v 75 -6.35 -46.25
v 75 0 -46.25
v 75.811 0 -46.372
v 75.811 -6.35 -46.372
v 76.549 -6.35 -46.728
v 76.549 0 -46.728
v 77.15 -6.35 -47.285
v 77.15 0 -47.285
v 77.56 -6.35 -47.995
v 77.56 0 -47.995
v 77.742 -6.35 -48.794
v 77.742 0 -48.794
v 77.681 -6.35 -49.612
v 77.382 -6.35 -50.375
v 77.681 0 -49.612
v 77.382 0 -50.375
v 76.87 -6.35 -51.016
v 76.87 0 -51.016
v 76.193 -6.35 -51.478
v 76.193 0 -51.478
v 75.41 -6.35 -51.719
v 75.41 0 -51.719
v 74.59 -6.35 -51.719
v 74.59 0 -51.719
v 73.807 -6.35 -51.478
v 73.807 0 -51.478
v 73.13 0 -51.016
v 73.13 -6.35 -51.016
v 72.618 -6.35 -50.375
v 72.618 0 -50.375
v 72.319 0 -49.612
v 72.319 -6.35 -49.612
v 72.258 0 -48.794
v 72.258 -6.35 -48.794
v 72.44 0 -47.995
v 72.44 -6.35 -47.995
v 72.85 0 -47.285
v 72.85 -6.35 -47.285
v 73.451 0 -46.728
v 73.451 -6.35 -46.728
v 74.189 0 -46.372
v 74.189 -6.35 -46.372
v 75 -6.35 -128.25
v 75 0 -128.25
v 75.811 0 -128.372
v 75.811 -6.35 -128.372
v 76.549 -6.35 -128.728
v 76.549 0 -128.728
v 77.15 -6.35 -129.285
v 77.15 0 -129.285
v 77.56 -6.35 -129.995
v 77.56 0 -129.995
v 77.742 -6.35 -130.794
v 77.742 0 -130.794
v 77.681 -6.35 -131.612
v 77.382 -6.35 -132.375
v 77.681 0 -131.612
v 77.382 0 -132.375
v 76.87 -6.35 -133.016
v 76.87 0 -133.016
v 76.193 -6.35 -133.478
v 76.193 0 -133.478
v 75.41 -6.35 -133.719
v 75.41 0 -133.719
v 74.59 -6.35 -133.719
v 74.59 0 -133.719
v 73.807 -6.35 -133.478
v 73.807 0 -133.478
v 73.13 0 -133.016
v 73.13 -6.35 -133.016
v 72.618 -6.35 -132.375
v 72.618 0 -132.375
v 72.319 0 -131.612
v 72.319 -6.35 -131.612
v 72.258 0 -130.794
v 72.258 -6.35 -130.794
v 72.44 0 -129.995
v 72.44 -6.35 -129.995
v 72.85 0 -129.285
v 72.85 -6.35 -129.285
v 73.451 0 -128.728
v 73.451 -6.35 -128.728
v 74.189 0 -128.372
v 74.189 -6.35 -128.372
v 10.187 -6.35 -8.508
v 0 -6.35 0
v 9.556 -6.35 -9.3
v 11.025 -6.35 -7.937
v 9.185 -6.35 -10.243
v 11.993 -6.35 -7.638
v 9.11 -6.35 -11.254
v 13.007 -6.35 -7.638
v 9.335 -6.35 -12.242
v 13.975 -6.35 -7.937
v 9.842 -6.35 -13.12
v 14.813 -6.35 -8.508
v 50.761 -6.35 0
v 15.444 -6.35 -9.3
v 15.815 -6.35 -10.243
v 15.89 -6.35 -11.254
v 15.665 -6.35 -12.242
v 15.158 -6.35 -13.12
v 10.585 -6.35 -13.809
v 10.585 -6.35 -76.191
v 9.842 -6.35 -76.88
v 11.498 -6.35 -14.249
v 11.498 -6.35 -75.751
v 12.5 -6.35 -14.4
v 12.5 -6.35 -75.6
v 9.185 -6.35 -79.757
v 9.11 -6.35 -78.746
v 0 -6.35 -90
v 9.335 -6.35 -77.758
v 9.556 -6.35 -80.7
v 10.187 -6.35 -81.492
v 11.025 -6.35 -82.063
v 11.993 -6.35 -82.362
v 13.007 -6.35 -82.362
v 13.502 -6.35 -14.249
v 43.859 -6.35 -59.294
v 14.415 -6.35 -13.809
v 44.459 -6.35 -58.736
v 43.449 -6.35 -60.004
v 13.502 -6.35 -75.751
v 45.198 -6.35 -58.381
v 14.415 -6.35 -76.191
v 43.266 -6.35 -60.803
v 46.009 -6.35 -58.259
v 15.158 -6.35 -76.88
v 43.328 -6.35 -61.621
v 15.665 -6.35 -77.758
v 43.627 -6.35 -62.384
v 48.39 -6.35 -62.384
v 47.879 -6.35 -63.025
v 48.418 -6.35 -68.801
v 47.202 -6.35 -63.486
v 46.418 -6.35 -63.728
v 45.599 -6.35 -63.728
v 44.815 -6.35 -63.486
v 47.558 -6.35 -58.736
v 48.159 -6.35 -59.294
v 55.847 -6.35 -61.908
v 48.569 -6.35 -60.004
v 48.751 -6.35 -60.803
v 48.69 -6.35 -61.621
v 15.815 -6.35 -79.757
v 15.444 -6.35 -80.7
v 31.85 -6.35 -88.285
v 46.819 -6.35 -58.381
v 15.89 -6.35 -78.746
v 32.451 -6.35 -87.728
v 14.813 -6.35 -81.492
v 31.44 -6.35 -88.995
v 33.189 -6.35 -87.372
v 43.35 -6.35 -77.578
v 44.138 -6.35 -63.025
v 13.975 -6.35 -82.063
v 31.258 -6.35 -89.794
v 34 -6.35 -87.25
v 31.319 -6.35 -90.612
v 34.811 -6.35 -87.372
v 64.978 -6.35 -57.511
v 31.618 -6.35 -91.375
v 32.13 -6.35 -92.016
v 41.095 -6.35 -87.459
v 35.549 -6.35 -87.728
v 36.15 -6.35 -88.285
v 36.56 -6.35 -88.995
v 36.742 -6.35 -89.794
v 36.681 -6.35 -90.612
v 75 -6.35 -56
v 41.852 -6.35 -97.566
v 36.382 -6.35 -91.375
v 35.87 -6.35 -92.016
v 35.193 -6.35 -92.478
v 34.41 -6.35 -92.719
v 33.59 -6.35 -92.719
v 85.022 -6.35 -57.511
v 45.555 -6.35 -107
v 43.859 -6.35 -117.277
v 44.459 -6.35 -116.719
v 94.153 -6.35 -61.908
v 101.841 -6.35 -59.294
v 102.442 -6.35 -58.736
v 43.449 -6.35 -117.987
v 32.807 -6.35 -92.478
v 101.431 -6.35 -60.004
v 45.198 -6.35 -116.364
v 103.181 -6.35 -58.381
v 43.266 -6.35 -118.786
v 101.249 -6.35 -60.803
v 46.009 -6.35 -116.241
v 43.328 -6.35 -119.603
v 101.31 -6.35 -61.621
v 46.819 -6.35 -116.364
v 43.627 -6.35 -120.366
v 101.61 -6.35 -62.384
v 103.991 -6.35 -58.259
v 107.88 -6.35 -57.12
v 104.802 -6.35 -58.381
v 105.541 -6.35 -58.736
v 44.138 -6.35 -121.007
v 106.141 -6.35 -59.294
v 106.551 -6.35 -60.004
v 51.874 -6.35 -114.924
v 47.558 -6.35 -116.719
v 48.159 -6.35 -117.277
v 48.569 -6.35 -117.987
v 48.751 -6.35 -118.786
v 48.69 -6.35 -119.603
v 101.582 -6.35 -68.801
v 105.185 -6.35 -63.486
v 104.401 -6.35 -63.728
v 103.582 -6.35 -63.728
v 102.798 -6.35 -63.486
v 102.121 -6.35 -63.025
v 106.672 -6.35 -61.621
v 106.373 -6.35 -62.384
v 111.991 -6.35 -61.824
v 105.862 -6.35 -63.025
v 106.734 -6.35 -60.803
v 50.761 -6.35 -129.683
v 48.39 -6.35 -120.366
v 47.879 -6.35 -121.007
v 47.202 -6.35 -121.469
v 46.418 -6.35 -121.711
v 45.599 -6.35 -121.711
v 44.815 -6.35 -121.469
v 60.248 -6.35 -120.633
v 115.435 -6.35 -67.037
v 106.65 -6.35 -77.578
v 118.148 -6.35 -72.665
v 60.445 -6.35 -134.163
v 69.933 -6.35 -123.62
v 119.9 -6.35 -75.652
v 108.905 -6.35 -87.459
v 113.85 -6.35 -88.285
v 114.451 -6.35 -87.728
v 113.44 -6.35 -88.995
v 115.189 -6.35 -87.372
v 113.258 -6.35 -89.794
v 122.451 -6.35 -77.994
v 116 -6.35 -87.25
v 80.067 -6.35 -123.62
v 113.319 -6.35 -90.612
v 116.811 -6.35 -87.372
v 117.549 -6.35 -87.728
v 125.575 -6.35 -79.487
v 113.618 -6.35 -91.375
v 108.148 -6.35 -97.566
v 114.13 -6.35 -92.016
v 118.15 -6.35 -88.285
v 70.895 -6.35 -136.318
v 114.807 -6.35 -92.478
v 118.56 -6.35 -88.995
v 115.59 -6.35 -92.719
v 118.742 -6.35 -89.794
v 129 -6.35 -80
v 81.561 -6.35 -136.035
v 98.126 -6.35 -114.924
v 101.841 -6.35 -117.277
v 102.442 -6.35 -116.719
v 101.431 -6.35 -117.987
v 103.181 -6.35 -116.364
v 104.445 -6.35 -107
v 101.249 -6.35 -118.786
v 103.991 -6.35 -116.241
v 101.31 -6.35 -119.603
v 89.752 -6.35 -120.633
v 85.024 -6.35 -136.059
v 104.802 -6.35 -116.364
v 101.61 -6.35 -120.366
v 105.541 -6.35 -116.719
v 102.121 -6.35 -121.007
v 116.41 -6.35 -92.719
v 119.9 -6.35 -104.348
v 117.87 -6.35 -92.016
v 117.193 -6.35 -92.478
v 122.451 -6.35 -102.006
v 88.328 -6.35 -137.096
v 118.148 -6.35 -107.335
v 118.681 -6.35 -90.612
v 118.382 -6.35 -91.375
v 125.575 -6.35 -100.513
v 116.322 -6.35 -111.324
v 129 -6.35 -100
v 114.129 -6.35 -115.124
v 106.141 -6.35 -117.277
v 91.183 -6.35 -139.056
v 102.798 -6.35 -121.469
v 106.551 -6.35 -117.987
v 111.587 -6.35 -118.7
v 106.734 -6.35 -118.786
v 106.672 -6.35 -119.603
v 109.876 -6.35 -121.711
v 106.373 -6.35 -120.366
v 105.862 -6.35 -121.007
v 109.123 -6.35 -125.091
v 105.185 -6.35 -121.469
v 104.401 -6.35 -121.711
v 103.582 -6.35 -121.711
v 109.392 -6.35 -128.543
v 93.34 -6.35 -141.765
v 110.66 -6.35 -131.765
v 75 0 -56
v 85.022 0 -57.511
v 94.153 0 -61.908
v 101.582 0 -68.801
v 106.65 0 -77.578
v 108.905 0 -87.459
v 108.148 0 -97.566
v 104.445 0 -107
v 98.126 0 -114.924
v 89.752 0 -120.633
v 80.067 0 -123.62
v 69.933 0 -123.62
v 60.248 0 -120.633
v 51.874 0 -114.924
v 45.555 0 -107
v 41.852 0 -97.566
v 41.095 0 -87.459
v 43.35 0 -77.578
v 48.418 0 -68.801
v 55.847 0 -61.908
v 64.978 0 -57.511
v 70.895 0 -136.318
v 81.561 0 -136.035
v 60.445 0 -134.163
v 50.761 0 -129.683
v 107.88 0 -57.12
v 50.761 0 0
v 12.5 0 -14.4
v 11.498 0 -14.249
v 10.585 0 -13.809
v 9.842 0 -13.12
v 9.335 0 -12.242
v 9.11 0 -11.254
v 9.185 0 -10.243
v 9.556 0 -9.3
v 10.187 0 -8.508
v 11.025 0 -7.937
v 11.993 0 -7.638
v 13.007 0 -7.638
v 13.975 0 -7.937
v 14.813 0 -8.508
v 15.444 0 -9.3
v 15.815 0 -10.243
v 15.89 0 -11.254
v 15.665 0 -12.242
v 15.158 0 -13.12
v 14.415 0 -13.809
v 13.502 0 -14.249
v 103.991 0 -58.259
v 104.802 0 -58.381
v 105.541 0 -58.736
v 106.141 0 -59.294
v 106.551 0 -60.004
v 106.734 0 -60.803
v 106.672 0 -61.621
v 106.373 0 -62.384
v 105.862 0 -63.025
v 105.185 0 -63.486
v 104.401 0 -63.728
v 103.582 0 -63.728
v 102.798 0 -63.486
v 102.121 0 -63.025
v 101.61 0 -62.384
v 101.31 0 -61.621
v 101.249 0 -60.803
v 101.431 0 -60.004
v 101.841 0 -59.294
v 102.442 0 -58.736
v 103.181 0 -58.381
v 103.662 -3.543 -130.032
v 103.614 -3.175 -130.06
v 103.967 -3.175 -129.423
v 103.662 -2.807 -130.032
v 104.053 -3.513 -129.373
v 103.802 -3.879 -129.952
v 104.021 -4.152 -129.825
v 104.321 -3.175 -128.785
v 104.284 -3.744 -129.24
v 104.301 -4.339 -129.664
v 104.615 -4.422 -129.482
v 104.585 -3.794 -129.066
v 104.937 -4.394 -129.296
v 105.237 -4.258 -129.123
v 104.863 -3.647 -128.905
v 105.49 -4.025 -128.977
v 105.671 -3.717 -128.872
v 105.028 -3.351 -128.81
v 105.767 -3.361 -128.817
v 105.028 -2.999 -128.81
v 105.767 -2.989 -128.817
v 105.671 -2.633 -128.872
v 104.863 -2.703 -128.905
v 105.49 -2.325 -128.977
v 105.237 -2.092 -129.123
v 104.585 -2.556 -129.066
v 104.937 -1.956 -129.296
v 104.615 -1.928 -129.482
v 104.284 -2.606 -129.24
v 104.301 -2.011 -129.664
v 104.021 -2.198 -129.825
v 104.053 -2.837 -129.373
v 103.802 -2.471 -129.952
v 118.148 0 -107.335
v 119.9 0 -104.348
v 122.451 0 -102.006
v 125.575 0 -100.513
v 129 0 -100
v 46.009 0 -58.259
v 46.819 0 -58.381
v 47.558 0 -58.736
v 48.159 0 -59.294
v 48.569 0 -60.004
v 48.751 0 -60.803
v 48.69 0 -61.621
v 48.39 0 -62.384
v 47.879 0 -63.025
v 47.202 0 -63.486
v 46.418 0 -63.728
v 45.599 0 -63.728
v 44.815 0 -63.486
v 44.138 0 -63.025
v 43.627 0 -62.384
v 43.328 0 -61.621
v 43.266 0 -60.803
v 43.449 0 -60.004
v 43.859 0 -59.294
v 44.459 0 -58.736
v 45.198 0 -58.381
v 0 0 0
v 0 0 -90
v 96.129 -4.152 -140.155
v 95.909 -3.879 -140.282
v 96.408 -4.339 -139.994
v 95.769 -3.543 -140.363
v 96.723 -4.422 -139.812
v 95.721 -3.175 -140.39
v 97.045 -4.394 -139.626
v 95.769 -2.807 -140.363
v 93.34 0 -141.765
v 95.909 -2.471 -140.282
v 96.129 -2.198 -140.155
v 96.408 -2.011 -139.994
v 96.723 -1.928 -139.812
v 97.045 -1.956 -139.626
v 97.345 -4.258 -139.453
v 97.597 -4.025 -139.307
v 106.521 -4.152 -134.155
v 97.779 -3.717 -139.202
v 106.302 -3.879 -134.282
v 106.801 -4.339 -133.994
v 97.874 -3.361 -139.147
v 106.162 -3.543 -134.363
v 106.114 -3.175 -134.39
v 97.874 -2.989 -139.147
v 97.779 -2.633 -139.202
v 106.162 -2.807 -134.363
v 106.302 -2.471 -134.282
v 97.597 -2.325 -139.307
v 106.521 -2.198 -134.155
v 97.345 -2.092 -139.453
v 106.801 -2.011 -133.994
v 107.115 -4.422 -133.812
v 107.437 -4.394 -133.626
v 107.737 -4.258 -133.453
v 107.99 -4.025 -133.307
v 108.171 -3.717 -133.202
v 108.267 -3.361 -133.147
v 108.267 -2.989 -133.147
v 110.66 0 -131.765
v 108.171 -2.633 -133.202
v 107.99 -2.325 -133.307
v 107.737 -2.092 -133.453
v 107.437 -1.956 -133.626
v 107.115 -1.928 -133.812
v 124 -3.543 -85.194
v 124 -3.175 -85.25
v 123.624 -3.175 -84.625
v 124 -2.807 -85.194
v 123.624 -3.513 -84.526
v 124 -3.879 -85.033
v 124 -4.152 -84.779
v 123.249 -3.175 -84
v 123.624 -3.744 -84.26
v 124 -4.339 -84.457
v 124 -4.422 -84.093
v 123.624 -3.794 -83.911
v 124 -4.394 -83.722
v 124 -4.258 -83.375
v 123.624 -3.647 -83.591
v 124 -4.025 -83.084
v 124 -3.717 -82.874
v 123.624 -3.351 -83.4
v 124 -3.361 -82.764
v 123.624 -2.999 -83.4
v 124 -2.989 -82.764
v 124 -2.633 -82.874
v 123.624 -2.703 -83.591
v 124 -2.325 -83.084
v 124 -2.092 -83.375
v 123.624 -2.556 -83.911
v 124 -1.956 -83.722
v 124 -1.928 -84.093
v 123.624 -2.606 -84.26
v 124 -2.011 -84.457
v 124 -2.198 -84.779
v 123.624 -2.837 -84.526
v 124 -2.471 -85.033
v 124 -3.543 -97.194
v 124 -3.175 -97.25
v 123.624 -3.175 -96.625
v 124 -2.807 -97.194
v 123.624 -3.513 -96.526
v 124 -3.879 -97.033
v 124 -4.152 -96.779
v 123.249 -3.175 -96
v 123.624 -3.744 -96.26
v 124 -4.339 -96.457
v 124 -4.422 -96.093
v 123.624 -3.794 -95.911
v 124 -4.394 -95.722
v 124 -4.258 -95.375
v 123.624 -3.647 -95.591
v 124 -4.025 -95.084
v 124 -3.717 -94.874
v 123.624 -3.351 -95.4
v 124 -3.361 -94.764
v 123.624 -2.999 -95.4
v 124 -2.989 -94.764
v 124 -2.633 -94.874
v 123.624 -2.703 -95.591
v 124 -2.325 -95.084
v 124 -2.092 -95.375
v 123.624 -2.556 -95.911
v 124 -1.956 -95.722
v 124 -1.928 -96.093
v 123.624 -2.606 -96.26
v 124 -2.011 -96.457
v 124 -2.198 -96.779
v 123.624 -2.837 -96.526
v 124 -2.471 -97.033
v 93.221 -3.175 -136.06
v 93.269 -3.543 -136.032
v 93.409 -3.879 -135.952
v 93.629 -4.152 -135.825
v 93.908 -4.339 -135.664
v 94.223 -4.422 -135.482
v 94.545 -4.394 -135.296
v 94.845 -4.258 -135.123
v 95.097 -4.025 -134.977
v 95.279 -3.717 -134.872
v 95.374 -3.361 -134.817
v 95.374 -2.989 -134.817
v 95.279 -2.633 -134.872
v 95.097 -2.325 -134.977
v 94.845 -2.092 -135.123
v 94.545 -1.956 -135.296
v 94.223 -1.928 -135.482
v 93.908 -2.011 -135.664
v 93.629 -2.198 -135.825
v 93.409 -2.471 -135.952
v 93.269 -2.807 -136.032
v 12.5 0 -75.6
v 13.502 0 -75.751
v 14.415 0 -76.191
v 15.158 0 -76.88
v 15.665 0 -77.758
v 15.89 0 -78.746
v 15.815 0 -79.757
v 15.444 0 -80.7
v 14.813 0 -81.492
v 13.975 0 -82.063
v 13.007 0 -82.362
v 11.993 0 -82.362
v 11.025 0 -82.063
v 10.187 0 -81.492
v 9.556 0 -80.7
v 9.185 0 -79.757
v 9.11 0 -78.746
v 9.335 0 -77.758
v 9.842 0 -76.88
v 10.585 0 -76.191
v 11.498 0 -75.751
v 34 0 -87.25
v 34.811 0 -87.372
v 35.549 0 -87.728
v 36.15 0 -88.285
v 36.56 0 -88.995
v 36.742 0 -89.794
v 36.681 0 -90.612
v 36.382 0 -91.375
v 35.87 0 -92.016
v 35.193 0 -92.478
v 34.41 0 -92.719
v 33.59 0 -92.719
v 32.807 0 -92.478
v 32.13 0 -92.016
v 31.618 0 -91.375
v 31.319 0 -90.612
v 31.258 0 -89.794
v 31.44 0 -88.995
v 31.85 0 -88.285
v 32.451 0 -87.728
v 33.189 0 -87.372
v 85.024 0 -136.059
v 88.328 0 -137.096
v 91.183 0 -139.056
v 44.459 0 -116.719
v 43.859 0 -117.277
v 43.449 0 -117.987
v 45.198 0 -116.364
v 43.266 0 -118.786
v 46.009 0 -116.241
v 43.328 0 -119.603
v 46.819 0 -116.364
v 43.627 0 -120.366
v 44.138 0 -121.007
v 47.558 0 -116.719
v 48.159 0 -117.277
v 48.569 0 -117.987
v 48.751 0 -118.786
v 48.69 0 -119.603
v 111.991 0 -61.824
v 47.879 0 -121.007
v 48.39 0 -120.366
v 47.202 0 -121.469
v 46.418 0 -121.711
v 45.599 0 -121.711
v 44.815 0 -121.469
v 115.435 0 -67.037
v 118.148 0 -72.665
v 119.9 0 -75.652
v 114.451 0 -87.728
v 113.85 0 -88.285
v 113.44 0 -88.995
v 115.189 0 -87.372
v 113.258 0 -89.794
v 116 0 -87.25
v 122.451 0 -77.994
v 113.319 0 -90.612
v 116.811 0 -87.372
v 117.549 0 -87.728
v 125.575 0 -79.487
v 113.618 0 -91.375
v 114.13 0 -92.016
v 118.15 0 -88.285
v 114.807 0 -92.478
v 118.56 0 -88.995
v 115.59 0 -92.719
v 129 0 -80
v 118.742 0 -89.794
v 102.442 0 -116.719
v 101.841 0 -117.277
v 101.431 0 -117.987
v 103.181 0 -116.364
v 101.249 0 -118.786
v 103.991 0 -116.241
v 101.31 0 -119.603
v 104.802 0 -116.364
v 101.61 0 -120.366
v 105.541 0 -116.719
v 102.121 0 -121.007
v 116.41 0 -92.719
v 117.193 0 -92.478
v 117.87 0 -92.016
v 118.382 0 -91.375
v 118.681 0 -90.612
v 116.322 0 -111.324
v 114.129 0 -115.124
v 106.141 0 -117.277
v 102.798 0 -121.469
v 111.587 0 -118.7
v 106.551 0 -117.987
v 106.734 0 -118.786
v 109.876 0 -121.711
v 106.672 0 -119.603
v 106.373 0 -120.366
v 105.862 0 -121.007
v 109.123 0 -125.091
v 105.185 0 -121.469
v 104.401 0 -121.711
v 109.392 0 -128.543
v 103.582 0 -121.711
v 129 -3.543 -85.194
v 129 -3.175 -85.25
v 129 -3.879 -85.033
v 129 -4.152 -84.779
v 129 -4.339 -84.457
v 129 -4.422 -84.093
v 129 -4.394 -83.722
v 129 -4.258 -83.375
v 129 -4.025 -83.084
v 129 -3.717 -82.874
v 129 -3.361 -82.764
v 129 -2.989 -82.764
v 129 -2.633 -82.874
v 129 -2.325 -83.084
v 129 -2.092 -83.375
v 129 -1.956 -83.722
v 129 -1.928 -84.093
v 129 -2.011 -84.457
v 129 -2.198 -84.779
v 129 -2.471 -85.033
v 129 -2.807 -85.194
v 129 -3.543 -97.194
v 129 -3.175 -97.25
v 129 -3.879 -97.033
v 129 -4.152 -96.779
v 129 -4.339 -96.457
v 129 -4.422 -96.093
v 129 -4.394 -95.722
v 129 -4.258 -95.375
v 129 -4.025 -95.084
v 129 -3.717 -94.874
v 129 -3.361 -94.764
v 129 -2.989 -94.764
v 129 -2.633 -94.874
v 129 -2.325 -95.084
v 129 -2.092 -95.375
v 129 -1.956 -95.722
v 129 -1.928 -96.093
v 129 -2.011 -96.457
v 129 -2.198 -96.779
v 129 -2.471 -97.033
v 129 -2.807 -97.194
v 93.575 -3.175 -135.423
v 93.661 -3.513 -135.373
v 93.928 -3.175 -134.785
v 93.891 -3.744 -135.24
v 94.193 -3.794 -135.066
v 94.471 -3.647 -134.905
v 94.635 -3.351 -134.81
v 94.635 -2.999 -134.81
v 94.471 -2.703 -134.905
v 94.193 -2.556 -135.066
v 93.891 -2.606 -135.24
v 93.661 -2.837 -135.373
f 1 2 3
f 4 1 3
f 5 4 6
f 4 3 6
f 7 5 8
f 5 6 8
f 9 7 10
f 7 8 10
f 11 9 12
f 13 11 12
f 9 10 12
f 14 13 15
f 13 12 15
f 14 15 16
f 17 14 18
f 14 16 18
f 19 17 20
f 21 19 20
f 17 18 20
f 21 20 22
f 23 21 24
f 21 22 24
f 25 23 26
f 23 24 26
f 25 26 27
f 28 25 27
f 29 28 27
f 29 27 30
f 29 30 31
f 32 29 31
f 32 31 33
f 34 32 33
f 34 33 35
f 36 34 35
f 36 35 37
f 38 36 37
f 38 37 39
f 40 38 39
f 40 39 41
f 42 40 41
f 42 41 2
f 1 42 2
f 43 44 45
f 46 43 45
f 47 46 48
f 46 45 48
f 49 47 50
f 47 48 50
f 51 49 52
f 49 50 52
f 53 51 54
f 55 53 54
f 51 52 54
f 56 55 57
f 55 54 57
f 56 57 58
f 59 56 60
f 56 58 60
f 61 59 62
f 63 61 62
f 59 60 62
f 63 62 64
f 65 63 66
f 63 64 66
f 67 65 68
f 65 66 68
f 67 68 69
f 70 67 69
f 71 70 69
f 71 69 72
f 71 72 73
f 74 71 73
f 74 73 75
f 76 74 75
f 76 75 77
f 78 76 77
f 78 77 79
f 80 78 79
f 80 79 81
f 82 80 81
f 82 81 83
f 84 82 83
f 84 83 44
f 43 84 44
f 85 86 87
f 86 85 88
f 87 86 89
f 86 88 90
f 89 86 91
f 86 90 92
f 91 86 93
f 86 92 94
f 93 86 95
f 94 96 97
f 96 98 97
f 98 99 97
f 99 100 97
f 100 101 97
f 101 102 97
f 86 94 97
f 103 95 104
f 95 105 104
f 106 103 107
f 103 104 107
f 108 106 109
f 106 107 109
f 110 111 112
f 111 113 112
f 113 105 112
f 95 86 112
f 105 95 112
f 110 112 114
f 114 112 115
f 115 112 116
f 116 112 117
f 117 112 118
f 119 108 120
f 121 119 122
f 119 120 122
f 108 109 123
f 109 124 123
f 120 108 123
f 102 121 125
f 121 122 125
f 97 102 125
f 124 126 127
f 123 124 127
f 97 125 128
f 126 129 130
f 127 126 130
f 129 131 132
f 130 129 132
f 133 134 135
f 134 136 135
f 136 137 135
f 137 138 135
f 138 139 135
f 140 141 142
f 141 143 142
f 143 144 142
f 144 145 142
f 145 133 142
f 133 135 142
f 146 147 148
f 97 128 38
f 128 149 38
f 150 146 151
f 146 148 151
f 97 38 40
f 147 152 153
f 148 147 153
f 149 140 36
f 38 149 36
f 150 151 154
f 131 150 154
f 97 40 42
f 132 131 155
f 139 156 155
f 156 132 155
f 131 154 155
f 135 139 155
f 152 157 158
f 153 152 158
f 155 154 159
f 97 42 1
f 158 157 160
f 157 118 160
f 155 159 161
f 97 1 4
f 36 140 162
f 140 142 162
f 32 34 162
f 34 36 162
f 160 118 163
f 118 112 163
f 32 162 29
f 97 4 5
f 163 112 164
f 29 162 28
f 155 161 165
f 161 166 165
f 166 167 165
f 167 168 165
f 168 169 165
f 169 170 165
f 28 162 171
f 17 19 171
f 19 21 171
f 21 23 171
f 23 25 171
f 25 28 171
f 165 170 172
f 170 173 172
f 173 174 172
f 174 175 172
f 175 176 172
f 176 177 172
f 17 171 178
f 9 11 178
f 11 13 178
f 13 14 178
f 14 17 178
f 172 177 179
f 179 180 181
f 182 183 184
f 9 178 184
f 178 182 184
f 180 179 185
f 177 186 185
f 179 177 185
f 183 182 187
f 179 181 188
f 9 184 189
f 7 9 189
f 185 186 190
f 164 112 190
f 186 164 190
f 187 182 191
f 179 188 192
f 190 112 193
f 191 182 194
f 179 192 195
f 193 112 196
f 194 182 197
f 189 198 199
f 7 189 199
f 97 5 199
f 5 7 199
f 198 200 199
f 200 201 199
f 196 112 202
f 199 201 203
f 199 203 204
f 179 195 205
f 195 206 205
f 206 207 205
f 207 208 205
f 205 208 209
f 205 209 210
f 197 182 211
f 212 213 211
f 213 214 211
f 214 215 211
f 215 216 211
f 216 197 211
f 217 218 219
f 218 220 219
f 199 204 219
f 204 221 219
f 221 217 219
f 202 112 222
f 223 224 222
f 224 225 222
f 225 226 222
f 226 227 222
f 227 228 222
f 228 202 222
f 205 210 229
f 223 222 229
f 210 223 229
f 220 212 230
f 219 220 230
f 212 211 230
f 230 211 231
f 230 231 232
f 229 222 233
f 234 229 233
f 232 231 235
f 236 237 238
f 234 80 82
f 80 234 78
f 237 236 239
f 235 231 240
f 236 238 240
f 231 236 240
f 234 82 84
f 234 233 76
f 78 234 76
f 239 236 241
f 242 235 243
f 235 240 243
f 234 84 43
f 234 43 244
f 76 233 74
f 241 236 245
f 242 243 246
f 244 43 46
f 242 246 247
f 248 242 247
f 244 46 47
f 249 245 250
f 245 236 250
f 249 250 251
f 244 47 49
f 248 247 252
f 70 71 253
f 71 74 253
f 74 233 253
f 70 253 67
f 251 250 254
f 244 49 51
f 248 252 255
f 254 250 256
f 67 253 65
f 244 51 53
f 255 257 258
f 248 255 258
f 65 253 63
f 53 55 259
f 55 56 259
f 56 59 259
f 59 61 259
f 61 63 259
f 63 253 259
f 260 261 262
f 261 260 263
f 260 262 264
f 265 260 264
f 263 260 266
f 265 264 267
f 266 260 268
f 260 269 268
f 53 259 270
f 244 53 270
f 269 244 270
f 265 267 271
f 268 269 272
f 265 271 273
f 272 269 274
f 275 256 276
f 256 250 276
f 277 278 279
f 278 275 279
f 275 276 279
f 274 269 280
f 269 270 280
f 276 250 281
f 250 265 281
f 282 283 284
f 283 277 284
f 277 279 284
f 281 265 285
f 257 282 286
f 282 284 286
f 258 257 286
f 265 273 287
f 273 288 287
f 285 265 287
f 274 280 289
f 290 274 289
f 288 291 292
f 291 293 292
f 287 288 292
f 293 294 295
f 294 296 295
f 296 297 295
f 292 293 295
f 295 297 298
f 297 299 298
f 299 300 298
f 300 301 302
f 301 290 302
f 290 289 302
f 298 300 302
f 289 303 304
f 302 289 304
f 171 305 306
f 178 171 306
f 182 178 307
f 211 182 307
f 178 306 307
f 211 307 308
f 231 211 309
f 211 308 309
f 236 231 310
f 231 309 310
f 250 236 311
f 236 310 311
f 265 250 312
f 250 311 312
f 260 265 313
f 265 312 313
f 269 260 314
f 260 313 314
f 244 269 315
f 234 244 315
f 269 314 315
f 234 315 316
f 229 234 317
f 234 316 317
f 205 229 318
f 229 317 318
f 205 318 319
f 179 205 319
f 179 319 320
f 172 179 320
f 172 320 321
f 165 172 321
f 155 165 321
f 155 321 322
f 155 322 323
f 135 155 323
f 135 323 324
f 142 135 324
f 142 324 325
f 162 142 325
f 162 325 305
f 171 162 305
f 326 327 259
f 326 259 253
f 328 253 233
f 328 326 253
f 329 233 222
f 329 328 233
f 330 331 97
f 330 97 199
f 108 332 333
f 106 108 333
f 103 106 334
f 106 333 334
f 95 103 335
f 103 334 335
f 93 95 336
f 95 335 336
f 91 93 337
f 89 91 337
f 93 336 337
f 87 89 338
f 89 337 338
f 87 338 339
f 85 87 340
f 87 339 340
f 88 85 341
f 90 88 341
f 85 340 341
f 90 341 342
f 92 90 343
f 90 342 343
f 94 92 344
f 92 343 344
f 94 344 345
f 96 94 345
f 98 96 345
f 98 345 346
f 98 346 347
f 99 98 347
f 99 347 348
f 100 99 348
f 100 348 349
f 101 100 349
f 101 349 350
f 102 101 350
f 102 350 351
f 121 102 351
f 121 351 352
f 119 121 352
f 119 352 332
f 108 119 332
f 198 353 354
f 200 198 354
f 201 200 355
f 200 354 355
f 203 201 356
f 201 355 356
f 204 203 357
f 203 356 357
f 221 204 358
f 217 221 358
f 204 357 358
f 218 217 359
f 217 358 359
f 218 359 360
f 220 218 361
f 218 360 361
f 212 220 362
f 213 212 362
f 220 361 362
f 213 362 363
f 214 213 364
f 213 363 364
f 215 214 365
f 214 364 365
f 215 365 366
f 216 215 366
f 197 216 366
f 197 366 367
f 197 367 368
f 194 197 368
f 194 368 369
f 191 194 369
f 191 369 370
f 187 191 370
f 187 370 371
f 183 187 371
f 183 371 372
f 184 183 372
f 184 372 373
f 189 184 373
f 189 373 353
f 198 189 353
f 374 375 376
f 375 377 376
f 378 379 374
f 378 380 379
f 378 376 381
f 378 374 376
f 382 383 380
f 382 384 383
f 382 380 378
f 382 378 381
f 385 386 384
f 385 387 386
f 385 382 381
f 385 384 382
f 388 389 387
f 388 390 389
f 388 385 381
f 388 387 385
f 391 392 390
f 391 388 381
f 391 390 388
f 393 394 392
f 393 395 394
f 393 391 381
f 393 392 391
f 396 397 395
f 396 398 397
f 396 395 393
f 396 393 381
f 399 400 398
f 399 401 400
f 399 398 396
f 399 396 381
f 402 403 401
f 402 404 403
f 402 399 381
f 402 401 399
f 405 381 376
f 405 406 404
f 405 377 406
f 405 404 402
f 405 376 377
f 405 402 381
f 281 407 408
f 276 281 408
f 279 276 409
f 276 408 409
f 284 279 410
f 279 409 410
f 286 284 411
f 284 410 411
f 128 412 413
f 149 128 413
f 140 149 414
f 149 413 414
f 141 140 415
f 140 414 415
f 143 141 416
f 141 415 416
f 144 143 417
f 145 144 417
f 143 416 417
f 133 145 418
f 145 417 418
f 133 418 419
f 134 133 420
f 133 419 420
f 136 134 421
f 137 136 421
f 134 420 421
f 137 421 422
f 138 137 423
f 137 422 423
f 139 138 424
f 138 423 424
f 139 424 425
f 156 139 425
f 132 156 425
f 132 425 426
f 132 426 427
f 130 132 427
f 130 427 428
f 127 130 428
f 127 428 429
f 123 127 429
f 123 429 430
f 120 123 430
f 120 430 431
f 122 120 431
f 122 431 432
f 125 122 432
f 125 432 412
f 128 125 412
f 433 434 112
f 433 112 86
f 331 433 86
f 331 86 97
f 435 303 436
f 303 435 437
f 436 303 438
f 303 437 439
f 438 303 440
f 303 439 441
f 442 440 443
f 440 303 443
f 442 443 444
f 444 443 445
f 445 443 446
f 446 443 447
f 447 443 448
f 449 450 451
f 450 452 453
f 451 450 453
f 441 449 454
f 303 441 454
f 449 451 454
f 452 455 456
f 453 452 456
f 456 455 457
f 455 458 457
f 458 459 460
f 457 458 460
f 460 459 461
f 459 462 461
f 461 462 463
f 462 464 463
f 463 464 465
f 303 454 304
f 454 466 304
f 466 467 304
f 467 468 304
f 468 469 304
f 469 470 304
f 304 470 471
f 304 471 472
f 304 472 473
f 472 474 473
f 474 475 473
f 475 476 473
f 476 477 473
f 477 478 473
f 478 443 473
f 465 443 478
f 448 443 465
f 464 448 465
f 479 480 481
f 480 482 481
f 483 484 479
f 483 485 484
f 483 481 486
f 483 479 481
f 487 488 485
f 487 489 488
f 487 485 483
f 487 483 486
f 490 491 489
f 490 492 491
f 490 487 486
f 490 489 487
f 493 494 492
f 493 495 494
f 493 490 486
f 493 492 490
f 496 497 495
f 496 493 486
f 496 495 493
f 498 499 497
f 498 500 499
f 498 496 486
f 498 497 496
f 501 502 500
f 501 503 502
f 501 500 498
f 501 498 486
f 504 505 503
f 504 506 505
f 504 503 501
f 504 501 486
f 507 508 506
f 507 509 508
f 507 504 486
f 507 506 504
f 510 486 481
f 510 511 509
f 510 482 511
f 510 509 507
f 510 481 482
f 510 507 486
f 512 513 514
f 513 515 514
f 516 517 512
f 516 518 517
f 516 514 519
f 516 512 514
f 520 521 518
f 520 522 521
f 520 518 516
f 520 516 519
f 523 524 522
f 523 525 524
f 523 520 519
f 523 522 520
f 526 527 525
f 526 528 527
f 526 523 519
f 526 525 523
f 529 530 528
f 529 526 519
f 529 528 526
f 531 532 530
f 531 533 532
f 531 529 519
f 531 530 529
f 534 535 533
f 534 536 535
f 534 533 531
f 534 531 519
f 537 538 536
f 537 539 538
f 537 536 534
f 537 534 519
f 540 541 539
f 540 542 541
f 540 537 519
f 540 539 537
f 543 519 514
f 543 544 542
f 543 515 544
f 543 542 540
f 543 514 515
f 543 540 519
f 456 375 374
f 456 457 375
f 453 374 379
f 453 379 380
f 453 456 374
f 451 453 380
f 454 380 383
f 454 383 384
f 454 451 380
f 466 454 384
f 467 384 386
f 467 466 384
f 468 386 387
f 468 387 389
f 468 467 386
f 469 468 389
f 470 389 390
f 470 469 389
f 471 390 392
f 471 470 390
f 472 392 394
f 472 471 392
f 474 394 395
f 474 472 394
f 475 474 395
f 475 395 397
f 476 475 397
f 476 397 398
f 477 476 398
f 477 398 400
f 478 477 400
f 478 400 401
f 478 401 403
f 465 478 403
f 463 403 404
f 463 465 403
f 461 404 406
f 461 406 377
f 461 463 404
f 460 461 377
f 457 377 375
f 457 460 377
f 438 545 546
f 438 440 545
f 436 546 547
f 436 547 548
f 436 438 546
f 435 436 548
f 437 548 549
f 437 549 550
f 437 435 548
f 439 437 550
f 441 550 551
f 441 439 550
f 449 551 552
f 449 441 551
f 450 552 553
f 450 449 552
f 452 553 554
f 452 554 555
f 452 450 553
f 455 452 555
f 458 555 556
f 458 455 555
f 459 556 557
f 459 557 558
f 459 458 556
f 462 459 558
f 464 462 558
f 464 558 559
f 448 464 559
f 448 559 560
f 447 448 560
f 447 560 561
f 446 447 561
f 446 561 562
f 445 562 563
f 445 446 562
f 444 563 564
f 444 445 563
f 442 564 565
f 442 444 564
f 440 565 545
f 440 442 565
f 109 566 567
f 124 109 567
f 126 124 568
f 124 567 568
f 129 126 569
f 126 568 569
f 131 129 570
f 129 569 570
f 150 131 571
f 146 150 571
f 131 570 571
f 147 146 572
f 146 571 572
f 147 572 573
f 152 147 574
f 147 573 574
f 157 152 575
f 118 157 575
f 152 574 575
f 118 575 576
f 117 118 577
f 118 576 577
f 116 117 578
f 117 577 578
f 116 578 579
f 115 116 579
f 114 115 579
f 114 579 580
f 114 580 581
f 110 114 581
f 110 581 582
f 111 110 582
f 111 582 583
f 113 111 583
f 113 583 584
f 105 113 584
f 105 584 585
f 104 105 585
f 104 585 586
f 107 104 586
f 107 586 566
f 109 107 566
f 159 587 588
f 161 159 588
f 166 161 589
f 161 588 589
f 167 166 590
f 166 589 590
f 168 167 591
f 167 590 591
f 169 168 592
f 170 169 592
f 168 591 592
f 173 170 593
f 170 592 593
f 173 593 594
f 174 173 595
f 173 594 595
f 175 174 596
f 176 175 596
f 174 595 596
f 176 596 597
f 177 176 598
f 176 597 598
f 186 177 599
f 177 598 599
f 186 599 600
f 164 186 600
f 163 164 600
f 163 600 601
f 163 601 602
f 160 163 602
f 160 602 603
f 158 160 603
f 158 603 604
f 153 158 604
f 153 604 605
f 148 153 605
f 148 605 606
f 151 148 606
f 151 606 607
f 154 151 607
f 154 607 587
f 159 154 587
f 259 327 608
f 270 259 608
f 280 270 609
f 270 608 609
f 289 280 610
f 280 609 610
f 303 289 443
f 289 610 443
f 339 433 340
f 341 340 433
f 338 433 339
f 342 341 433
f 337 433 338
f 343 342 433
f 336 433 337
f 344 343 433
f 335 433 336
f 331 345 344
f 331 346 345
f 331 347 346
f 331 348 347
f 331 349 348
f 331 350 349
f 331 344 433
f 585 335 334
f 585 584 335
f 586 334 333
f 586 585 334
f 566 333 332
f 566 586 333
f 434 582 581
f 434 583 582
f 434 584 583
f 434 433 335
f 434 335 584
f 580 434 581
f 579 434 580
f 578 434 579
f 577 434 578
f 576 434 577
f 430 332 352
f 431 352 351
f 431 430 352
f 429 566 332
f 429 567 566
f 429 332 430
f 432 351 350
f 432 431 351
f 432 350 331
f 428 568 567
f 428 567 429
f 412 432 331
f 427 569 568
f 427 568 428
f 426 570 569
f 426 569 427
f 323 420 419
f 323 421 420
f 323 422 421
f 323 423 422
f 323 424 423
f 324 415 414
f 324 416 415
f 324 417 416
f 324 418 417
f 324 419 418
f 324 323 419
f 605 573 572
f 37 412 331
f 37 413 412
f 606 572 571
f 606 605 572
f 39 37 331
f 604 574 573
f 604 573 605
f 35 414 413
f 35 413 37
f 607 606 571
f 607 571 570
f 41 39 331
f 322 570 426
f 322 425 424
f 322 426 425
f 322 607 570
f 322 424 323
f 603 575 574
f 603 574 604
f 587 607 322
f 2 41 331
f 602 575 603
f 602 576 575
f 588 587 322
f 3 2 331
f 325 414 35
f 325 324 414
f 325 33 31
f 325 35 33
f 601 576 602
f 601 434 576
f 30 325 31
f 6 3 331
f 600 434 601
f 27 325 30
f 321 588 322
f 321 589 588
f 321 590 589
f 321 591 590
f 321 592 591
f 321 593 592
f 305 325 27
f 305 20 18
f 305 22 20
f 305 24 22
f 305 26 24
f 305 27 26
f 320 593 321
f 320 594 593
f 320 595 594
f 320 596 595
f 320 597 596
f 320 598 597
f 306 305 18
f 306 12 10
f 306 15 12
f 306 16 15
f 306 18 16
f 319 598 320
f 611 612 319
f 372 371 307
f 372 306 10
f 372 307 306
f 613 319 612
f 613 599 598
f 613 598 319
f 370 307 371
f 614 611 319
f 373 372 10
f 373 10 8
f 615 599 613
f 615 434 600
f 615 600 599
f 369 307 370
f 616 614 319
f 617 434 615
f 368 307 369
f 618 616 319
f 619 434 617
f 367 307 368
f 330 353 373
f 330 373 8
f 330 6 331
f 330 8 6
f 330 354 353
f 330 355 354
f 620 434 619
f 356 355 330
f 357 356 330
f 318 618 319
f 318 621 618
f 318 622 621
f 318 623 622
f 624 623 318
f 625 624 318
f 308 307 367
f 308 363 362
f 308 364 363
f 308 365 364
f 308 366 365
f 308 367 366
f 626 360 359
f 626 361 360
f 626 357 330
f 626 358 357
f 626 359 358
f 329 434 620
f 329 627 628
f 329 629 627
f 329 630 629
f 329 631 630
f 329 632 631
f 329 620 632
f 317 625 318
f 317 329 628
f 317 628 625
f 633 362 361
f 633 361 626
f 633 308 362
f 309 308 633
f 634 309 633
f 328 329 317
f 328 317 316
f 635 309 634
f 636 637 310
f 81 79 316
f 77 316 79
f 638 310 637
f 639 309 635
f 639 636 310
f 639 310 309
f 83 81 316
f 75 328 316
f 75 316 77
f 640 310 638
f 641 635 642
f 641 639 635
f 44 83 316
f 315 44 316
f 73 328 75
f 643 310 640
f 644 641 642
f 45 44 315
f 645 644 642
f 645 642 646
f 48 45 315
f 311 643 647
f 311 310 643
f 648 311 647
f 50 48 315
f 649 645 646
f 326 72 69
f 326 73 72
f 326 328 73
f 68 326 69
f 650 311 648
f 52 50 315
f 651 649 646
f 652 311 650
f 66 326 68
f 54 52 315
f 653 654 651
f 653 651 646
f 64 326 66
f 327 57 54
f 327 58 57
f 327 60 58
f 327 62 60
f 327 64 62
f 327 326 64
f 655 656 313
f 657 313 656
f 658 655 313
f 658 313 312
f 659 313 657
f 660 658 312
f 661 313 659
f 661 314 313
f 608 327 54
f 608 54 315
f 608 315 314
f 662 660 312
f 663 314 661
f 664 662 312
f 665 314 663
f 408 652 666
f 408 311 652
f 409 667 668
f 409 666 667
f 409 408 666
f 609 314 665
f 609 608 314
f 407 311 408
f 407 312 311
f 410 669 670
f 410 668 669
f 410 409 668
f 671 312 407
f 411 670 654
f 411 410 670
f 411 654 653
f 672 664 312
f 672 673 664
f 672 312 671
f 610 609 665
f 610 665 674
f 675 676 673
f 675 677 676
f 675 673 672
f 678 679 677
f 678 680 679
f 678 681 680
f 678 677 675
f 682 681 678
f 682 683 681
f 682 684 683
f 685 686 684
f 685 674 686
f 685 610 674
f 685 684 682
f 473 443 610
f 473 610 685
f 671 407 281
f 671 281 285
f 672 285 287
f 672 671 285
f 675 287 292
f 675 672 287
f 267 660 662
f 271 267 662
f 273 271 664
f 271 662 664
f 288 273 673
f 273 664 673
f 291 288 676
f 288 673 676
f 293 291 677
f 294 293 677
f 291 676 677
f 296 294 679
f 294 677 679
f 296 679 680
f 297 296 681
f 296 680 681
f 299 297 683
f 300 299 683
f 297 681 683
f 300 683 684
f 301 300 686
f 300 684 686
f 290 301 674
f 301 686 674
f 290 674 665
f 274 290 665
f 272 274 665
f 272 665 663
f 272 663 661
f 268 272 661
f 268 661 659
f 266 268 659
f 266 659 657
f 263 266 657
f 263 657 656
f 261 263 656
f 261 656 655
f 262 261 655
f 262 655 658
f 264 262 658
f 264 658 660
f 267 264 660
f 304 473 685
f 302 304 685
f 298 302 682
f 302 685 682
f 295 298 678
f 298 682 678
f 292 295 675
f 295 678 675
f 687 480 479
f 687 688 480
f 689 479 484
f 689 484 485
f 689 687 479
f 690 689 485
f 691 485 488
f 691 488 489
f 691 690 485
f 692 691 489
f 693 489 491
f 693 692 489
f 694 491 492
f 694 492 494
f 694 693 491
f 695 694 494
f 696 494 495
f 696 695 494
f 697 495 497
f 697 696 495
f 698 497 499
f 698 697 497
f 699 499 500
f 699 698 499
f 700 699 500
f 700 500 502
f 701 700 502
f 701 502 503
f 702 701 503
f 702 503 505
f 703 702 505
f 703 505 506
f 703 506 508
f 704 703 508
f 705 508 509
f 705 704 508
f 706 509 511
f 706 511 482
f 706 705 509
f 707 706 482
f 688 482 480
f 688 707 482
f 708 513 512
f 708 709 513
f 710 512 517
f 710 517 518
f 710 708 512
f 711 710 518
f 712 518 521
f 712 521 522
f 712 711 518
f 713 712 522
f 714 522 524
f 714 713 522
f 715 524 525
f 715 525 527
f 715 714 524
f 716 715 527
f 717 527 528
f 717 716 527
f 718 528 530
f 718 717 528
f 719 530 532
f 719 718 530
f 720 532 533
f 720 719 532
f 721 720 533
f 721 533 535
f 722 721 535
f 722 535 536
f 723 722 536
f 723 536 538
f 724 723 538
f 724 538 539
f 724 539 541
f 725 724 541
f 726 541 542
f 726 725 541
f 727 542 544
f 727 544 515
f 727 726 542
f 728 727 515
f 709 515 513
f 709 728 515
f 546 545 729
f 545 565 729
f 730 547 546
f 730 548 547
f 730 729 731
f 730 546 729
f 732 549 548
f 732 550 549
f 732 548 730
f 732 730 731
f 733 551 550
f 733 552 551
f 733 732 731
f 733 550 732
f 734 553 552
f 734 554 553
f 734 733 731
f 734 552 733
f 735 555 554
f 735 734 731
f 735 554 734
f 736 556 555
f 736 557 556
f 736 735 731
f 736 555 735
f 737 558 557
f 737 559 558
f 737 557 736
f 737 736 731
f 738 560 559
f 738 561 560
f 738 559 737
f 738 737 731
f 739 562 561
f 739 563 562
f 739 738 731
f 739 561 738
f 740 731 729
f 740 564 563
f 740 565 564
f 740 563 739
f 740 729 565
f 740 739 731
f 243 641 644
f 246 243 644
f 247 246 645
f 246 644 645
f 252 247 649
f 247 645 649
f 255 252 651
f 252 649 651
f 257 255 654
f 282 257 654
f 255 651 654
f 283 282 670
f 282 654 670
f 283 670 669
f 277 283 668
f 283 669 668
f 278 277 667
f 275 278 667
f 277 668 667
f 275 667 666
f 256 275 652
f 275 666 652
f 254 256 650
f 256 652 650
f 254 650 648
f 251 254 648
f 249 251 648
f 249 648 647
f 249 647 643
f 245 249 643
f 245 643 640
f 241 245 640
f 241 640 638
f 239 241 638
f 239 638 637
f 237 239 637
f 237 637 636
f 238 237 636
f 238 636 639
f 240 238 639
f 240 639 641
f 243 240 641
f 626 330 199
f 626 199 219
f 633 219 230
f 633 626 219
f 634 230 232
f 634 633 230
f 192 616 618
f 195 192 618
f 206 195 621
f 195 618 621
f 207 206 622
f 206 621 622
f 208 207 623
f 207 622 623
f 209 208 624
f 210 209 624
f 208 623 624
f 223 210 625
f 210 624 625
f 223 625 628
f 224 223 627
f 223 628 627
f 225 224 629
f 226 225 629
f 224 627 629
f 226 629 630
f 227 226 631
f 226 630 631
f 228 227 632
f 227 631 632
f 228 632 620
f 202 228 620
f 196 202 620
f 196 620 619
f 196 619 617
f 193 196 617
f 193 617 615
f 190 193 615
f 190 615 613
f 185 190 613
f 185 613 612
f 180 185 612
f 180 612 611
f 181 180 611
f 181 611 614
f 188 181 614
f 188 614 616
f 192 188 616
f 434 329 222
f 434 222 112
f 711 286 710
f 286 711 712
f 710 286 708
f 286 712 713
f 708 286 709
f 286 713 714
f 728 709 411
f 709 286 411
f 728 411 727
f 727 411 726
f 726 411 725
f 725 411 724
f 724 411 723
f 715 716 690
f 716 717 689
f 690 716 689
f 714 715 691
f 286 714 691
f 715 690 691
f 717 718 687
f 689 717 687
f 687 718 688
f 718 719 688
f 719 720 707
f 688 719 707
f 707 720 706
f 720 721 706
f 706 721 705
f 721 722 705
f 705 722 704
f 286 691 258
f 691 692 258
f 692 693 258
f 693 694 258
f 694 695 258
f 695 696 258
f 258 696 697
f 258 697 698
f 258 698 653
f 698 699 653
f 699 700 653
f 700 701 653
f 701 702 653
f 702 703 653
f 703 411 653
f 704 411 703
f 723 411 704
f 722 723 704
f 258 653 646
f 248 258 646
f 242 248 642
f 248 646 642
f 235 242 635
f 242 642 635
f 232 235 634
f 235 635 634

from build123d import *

# Parameters (mm, degrees)
BASE_FLANGE1_DEPTH = 6.35
SKETCH8_R          = 3.4
CUT_EXTRUDE1_DEPTH = 183.851914127
SKETCH9_R          = 34
CUT_EXTRUDE2_DEPTH = 183.851914127
SKETCH10_R         = 2.75
CUT_EXTRUDE3_DEPTH = 183.851914127
TABS_1_START       = -6.35
TABS_1_DEPTH       = 6.35
TABS_2_AT_2_COUNT  = 2
TABS_2_AT_2_PITCH  = 12
CIRPATTERN2_COUNT  = 2
CIRPATTERN2_ANGLE  = 60


# Sheet-metal steps are written as plain solids
with BuildPart() as part:
    # Sketch2 → Base-Flange1 (new body)
    with BuildSketch(Plane(origin=(0, 0, 0), x_dir=(1, 0, 0), z_dir=(0, 1, 0))):
        with BuildLine():
            Line((0, 0), (50.76093065, 0))
            Line((50.76093065, 0), (107.880465325, 57.119534675))
            ThreePointArc((107.880465325, 57.119534675), (111.537953618, 118.761570635), (50.76093065, 129.682710556))
            Line((50.76093065, 129.682710556), (0, 90))
            Line((0, 90), (0, 0))
        make_face()
    extrude(amount=-BASE_FLANGE1_DEPTH)

    # Sketch8 → Cut-Extrude1 (cut, through all)
    with BuildSketch(Plane(origin=(0, 0, 0), x_dir=(1, 0, 0), z_dir=(0, 1, 0))):
        with Locations(Location((12.5, 79, 0), (0, 0, 270))):
            Circle(SKETCH8_R)
        with Locations(Location((12.5, 11, 0), (0, 0, 90))):
            Circle(SKETCH8_R)
    extrude(amount=-CUT_EXTRUDE1_DEPTH, mode=Mode.SUBTRACT)

    # Sketch9 → Cut-Extrude2 (cut, through all)
    with BuildSketch(Plane(origin=(0, 0, 0), x_dir=(1, 0, 0), z_dir=(0, 1, 0))):
        with Locations(Location((75, 90, 0), (0, 0, 270))):
            Circle(SKETCH9_R)
    extrude(amount=-CUT_EXTRUDE2_DEPTH, mode=Mode.SUBTRACT)

    # Sketch10 → Cut-Extrude3 (cut, through all)
    with BuildSketch(Plane(origin=(0, 0, 0), x_dir=(1, 0, 0), z_dir=(0, 1, 0))):
        with Locations(Location((75, 131, 0), (0, 0, 270))):
            Circle(SKETCH10_R)
        with Locations(Location((103.991378029, 118.991378029, 0), (0, 0, 270))):
            Circle(SKETCH10_R)
        with Locations(Location((116, 90, 0), (0, 0, 270))):
            Circle(SKETCH10_R)
        with Locations(Location((103.991378029, 61.008621971, 0), (0, 0, 270))):
            Circle(SKETCH10_R)
        with Locations(Location((75, 49, 0), (0, 0, 270))):
            Circle(SKETCH10_R)
        with Locations(Location((46.008621971, 61.008621971, 0), (0, 0, 270))):
            Circle(SKETCH10_R)
        with Locations(Location((34, 90, 0), (0, 0, 270))):
            Circle(SKETCH10_R)
        with Locations(Location((46.008621971, 118.991378029, 0), (0, 0, 270))):
            Circle(SKETCH10_R)
    extrude(amount=-CUT_EXTRUDE3_DEPTH, mode=Mode.SUBTRACT)

    # Sketch11 → Tabs_1 (add)
    with BuildSketch(Plane.XZ.offset(6.35).offset(TABS_1_START)):
        with BuildLine():
            Line((129, -100), (129, -80))
            ThreePointArc((129, -80), (122.450687881, -77.994187792), (118.147884423, -72.66477373))
            ThreePointArc((118.147884423, -72.66477373), (121.5, -90), (118.147884423, -107.33522627))
            ThreePointArc((118.147884423, -107.33522627), (122.450687881, -102.005812208), (129, -100))
        make_face()
    tabs_1 = extrude(amount=TABS_1_DEPTH)

    # Sketch20 → Tabs_2 (revolve, cut)
    with BuildSketch(Plane(origin=(129, -3.175, -84), x_dir=(0, 0, -1), z_dir=(0, 1, 0))):
        Polygon((0, 0), (0, 5.751075774), (1.25, 5), (1.25, 0), align=None)
    tabs_2 = revolve(axis=Axis((135.35, -3.175, -84), (-1, 0, 0)), mode=Mode.SUBTRACT)

    # Tabs_2 at 2: Tabs_2 ×2
    with Locations(*[(0, 0, -i * TABS_2_AT_2_PITCH) for i in range(1, TABS_2_AT_2_COUNT)]):
        add(tabs_2, mode=Mode.SUBTRACT)

    # CirPattern2: Tabs_1, Tabs_2 ×2 about axis
    cirpattern2_axis = Axis((75, 0, -90), (0, 1, 0))
    add([tabs_1.rotate(cirpattern2_axis, i * CIRPATTERN2_ANGLE / (CIRPATTERN2_COUNT - 1)) for i in range(1, CIRPATTERN2_COUNT)])
    add([tabs_2.rotate(cirpattern2_axis, i * CIRPATTERN2_ANGLE / (CIRPATTERN2_COUNT - 1)) for i in range(1, CIRPATTERN2_COUNT)], mode=Mode.SUBTRACT)

    # CirPattern2 copy 1 sketch → CirPattern2 copy 1 (revolve, cut)
    with BuildSketch(Plane(origin=(96.803847577, -3.175, -139.765371804), x_dir=(-0.8660254037844399, 0, -0.4999999999999978), z_dir=(0, 1, 0))):
        Polygon((0, 0), (0, 5.751075774), (1.25, 5), (1.25, 0), align=None)
    revolve(axis=Axis((99.978847577, -3.175, -145.264633118), (-0.4999999999999978, 0, 0.8660254037844399)), mode=Mode.SUBTRACT)


solid = part.part
